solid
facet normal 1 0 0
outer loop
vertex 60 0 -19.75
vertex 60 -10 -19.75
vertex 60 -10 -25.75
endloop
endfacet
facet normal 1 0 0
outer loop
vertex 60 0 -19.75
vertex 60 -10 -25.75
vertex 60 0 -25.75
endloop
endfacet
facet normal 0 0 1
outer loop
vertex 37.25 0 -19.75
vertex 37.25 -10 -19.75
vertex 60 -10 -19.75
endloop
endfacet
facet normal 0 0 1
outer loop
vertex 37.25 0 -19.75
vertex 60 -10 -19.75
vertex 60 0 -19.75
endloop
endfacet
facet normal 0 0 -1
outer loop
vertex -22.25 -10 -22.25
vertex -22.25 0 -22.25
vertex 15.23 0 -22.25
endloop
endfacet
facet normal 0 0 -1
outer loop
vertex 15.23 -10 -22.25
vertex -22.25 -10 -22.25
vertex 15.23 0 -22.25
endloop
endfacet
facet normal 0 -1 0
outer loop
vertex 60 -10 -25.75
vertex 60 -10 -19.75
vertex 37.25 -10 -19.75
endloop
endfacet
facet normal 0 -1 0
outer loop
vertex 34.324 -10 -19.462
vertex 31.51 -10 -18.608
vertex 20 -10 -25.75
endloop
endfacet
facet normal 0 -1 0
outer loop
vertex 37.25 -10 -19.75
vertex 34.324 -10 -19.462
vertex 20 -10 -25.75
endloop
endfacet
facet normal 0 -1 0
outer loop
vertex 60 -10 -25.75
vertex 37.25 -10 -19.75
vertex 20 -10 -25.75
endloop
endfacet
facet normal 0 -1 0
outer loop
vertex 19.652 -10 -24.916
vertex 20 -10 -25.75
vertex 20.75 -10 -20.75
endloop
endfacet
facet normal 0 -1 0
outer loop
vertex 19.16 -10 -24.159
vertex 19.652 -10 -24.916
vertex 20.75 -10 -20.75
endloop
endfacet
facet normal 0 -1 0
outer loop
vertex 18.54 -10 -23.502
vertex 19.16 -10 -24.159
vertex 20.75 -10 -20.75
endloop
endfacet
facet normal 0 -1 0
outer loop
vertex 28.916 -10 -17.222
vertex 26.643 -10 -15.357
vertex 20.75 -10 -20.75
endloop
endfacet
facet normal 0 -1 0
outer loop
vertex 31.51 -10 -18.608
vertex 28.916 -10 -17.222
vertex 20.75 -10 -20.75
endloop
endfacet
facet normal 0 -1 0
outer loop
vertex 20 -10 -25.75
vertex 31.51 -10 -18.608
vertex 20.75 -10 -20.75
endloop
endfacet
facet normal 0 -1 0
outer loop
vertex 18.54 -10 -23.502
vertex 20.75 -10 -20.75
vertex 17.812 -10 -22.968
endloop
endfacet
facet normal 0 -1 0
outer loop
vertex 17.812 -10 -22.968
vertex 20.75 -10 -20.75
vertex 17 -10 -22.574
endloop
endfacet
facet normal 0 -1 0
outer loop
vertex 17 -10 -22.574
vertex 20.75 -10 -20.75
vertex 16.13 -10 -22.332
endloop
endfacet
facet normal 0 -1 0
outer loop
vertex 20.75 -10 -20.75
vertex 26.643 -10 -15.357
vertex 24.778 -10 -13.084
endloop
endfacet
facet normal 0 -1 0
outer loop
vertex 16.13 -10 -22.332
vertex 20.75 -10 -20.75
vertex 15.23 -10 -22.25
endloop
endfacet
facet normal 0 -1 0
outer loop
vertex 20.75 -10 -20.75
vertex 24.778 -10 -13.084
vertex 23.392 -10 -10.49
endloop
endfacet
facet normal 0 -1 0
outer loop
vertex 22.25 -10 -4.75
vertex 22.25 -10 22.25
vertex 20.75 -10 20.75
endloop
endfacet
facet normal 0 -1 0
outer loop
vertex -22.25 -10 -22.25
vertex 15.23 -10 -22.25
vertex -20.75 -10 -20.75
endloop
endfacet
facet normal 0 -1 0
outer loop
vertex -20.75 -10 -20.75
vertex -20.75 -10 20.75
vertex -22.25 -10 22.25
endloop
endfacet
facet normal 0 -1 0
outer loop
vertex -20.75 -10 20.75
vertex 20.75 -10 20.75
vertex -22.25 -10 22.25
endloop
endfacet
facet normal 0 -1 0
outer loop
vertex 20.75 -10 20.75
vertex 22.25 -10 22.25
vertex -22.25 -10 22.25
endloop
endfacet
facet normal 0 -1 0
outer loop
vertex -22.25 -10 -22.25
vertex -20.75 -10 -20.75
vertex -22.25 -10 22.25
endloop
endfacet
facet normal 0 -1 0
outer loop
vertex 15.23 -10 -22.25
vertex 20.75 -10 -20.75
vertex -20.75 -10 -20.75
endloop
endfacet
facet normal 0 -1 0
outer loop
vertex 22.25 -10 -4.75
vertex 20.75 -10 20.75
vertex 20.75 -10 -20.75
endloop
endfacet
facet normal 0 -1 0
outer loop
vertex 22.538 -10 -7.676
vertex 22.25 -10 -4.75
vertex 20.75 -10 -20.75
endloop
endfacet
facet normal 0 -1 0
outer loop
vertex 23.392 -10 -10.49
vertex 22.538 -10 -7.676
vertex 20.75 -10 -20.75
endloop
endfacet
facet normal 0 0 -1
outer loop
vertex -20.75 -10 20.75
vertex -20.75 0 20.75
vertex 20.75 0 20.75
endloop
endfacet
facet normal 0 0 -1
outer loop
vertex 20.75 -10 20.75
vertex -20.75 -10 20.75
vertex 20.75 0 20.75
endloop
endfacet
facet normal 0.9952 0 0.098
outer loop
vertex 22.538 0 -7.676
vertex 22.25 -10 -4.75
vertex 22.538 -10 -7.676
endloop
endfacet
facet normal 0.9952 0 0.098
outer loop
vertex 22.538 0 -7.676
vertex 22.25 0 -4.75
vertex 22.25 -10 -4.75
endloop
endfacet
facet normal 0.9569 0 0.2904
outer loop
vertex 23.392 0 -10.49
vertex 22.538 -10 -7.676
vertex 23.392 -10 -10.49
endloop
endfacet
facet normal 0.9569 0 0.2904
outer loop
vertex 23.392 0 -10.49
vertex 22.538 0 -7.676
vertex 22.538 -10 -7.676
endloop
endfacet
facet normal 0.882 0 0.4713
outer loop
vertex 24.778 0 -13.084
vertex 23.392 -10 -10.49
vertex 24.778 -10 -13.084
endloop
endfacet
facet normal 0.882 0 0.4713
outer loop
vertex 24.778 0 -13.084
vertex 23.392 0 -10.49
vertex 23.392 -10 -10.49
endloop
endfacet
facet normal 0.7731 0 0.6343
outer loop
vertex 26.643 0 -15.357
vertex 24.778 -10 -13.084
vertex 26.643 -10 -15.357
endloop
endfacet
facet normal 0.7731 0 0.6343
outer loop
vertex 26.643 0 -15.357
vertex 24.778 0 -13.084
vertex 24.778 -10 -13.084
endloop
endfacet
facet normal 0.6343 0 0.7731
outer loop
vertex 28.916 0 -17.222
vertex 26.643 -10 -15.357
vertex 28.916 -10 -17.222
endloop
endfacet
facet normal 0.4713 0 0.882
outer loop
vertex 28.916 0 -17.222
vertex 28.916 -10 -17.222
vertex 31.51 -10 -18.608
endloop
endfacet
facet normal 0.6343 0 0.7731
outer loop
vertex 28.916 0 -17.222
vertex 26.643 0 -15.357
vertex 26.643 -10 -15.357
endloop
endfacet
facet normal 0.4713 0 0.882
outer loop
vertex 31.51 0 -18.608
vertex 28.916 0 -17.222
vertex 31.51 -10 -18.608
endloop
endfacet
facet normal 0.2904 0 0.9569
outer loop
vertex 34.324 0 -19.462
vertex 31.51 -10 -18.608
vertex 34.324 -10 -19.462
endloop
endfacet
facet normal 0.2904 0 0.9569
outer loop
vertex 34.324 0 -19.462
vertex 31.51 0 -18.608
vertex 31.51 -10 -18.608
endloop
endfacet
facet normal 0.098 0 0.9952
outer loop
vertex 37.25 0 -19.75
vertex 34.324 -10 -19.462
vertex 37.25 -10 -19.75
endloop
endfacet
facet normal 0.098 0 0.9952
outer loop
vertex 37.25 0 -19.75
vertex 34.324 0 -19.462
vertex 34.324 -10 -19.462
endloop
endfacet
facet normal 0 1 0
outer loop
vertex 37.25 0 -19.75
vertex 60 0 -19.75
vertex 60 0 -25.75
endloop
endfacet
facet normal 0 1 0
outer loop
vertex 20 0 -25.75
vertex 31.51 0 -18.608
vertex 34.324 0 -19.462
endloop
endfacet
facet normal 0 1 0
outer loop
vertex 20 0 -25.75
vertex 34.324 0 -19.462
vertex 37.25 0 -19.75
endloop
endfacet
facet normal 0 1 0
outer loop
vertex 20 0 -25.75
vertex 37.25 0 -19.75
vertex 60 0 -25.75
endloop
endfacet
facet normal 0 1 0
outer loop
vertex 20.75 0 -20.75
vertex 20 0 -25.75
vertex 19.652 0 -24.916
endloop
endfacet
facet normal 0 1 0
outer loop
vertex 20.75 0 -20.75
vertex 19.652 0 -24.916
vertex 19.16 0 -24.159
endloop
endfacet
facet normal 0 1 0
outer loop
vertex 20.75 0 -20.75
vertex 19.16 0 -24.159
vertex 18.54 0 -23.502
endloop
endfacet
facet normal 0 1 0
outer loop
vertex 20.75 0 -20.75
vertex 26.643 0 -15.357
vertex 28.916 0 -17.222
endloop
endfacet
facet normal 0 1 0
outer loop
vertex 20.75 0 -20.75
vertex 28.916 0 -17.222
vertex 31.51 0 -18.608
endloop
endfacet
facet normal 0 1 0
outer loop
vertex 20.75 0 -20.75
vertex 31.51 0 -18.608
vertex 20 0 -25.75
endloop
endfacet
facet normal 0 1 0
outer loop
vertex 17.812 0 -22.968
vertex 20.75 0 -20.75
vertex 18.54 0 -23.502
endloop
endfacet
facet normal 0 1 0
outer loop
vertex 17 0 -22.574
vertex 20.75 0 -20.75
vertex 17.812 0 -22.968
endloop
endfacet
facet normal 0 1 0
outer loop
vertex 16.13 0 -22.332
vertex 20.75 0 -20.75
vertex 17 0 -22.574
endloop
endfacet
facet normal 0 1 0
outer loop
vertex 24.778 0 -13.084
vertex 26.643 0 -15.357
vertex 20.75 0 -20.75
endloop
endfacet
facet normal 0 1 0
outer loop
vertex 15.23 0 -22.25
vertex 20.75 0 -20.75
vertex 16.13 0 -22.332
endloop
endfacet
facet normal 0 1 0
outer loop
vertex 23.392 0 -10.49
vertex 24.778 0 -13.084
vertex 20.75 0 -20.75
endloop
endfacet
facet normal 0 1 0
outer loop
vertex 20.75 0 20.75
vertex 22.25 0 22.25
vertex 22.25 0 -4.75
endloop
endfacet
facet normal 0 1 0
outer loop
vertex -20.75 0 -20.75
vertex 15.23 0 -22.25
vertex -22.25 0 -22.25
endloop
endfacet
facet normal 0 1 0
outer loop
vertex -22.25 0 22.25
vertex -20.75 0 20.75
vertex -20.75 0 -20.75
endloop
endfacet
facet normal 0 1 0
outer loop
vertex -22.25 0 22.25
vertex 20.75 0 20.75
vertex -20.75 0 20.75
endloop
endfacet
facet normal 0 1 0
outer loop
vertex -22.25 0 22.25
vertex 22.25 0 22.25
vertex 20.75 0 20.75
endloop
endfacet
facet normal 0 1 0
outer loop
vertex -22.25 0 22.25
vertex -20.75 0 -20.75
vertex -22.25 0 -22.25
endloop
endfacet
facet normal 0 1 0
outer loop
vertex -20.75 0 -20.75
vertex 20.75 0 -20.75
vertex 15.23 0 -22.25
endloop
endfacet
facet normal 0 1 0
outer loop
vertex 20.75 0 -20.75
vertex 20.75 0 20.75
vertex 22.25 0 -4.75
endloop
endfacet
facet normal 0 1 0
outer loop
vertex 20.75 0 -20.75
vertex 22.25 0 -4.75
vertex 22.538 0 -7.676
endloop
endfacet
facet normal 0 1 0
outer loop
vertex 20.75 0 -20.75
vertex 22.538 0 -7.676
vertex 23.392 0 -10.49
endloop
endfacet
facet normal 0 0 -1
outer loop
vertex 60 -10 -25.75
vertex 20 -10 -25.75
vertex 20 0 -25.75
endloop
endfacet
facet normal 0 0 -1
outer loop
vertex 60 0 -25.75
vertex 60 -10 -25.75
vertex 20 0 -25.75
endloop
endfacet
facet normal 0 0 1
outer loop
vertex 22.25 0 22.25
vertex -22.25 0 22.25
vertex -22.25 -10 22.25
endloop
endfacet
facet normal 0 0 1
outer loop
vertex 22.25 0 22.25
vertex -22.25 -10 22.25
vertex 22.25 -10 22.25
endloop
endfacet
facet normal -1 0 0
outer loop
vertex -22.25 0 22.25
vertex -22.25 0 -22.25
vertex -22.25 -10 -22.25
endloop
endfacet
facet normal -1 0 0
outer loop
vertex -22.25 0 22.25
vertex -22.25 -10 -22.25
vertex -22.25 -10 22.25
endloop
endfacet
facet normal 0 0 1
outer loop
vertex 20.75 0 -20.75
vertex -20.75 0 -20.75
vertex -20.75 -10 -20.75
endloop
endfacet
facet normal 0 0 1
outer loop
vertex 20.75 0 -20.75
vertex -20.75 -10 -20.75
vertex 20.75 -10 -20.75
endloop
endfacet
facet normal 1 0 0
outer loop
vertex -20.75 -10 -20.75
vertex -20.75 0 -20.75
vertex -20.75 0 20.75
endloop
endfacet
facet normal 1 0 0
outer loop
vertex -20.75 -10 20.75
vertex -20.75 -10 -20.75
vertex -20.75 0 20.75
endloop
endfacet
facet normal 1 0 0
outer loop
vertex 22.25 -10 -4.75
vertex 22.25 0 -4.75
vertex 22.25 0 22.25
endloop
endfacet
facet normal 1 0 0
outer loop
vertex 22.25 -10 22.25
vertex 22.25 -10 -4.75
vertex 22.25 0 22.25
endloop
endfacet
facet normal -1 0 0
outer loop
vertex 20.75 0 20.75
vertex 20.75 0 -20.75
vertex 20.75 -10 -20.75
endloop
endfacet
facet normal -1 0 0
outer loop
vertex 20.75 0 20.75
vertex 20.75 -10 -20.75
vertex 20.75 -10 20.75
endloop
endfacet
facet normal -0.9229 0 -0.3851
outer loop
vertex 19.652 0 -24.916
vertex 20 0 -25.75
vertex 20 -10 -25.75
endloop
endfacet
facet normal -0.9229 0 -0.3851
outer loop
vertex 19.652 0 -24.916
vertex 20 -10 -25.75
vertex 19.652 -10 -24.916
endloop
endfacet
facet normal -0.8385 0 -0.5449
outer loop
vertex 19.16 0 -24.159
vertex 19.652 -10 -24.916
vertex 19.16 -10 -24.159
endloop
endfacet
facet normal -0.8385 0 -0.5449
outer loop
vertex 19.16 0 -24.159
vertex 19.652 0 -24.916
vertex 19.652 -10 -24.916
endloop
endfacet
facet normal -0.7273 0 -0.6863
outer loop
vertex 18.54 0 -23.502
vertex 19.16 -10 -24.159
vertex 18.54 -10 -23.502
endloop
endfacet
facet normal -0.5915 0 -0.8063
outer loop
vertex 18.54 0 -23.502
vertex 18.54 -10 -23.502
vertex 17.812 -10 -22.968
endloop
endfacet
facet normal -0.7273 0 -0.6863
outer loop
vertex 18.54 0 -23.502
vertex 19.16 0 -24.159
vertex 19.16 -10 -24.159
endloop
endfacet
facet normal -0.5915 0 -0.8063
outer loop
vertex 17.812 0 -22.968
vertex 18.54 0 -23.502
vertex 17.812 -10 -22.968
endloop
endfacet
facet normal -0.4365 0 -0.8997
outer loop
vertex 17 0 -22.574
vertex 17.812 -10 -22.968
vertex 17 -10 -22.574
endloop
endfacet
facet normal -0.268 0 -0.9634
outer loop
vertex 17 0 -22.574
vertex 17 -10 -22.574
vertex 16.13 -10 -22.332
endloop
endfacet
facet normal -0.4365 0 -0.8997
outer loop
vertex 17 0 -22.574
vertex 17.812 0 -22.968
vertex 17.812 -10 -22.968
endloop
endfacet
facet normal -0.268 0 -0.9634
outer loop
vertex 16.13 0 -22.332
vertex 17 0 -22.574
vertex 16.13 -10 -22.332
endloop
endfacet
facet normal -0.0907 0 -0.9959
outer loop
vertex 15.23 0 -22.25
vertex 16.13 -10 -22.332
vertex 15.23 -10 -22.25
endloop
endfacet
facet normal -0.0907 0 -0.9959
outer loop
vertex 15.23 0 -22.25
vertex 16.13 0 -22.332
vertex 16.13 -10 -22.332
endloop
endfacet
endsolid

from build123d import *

# Parameters (mm, degrees)
F0_W        = 44.5
F0_H        = 44.5
F1_DEPTH    = 10
F2_W        = 41.5
F2_H        = 41.5
F3_DEPTH    = 10
F5_START    = 20
F4_W        = 10
F4_H        = 6
F5_DEPTH    = 40
F6_W        = 18.9917886164
F6_H        = 12.0773017406
F7_DEPTH    = 25
F8_R        = 15
F9_T1_DEPTH = 10


# Not quite as in the source:
# - a fillet or chamfer that OpenCascade refuses, or shapes differently, is made with other operations: its cross-section is extruded or revolved along the edge and cut away or added


with BuildPart() as f1:
    # F0 (on Front) → F1 (new body)
    with BuildSketch(Plane.XZ):
        Rectangle(F0_W, F0_H)
    extrude(amount=F1_DEPTH)

    # F2 (on Front) → F3 (cut)
    with BuildSketch(Plane.XZ):
        Rectangle(F2_W, F2_H)
    extrude(amount=F3_DEPTH, mode=Mode.SUBTRACT)

    # F4 (on Right) → F5 (join)
    with BuildSketch(Plane.YZ.offset(F5_START)):
        with Locations((-5, -22.75)):
            Rectangle(F4_W, F4_H)
    extrude(amount=F5_DEPTH)

    # F6 (on Front) → F7 (cut)
    with BuildSketch(Plane.XZ):
        with Locations((11.2541056918, -14.7113491297)):
            Rectangle(F6_W, F6_H)
    extrude(amount=F7_DEPTH, mode=Mode.SUBTRACT)

    # F8
    f8_edges = [f1.edges().sort_by_distance(p)[0] for p in [
        (22.25, -5, -19.75),
    ]]
    fillet(f8_edges, radius=F8_R)

    # F9: fillet of radius 5 on 1 edges, made by hand

    # F9_s2 → F9_t1 (join)
    with BuildSketch(Plane.XZ):
        with BuildLine():
            ThreePointArc((20, -25.75), (18.1883438845, -23.2188711259), (15.2303039929, -22.25))
            Line((15.2303039929, -22.25), (20, -22.25))
            Line((20, -22.25), (20, -25.75))
        make_face()
    extrude(amount=F9_T1_DEPTH)


solid = f1.part
